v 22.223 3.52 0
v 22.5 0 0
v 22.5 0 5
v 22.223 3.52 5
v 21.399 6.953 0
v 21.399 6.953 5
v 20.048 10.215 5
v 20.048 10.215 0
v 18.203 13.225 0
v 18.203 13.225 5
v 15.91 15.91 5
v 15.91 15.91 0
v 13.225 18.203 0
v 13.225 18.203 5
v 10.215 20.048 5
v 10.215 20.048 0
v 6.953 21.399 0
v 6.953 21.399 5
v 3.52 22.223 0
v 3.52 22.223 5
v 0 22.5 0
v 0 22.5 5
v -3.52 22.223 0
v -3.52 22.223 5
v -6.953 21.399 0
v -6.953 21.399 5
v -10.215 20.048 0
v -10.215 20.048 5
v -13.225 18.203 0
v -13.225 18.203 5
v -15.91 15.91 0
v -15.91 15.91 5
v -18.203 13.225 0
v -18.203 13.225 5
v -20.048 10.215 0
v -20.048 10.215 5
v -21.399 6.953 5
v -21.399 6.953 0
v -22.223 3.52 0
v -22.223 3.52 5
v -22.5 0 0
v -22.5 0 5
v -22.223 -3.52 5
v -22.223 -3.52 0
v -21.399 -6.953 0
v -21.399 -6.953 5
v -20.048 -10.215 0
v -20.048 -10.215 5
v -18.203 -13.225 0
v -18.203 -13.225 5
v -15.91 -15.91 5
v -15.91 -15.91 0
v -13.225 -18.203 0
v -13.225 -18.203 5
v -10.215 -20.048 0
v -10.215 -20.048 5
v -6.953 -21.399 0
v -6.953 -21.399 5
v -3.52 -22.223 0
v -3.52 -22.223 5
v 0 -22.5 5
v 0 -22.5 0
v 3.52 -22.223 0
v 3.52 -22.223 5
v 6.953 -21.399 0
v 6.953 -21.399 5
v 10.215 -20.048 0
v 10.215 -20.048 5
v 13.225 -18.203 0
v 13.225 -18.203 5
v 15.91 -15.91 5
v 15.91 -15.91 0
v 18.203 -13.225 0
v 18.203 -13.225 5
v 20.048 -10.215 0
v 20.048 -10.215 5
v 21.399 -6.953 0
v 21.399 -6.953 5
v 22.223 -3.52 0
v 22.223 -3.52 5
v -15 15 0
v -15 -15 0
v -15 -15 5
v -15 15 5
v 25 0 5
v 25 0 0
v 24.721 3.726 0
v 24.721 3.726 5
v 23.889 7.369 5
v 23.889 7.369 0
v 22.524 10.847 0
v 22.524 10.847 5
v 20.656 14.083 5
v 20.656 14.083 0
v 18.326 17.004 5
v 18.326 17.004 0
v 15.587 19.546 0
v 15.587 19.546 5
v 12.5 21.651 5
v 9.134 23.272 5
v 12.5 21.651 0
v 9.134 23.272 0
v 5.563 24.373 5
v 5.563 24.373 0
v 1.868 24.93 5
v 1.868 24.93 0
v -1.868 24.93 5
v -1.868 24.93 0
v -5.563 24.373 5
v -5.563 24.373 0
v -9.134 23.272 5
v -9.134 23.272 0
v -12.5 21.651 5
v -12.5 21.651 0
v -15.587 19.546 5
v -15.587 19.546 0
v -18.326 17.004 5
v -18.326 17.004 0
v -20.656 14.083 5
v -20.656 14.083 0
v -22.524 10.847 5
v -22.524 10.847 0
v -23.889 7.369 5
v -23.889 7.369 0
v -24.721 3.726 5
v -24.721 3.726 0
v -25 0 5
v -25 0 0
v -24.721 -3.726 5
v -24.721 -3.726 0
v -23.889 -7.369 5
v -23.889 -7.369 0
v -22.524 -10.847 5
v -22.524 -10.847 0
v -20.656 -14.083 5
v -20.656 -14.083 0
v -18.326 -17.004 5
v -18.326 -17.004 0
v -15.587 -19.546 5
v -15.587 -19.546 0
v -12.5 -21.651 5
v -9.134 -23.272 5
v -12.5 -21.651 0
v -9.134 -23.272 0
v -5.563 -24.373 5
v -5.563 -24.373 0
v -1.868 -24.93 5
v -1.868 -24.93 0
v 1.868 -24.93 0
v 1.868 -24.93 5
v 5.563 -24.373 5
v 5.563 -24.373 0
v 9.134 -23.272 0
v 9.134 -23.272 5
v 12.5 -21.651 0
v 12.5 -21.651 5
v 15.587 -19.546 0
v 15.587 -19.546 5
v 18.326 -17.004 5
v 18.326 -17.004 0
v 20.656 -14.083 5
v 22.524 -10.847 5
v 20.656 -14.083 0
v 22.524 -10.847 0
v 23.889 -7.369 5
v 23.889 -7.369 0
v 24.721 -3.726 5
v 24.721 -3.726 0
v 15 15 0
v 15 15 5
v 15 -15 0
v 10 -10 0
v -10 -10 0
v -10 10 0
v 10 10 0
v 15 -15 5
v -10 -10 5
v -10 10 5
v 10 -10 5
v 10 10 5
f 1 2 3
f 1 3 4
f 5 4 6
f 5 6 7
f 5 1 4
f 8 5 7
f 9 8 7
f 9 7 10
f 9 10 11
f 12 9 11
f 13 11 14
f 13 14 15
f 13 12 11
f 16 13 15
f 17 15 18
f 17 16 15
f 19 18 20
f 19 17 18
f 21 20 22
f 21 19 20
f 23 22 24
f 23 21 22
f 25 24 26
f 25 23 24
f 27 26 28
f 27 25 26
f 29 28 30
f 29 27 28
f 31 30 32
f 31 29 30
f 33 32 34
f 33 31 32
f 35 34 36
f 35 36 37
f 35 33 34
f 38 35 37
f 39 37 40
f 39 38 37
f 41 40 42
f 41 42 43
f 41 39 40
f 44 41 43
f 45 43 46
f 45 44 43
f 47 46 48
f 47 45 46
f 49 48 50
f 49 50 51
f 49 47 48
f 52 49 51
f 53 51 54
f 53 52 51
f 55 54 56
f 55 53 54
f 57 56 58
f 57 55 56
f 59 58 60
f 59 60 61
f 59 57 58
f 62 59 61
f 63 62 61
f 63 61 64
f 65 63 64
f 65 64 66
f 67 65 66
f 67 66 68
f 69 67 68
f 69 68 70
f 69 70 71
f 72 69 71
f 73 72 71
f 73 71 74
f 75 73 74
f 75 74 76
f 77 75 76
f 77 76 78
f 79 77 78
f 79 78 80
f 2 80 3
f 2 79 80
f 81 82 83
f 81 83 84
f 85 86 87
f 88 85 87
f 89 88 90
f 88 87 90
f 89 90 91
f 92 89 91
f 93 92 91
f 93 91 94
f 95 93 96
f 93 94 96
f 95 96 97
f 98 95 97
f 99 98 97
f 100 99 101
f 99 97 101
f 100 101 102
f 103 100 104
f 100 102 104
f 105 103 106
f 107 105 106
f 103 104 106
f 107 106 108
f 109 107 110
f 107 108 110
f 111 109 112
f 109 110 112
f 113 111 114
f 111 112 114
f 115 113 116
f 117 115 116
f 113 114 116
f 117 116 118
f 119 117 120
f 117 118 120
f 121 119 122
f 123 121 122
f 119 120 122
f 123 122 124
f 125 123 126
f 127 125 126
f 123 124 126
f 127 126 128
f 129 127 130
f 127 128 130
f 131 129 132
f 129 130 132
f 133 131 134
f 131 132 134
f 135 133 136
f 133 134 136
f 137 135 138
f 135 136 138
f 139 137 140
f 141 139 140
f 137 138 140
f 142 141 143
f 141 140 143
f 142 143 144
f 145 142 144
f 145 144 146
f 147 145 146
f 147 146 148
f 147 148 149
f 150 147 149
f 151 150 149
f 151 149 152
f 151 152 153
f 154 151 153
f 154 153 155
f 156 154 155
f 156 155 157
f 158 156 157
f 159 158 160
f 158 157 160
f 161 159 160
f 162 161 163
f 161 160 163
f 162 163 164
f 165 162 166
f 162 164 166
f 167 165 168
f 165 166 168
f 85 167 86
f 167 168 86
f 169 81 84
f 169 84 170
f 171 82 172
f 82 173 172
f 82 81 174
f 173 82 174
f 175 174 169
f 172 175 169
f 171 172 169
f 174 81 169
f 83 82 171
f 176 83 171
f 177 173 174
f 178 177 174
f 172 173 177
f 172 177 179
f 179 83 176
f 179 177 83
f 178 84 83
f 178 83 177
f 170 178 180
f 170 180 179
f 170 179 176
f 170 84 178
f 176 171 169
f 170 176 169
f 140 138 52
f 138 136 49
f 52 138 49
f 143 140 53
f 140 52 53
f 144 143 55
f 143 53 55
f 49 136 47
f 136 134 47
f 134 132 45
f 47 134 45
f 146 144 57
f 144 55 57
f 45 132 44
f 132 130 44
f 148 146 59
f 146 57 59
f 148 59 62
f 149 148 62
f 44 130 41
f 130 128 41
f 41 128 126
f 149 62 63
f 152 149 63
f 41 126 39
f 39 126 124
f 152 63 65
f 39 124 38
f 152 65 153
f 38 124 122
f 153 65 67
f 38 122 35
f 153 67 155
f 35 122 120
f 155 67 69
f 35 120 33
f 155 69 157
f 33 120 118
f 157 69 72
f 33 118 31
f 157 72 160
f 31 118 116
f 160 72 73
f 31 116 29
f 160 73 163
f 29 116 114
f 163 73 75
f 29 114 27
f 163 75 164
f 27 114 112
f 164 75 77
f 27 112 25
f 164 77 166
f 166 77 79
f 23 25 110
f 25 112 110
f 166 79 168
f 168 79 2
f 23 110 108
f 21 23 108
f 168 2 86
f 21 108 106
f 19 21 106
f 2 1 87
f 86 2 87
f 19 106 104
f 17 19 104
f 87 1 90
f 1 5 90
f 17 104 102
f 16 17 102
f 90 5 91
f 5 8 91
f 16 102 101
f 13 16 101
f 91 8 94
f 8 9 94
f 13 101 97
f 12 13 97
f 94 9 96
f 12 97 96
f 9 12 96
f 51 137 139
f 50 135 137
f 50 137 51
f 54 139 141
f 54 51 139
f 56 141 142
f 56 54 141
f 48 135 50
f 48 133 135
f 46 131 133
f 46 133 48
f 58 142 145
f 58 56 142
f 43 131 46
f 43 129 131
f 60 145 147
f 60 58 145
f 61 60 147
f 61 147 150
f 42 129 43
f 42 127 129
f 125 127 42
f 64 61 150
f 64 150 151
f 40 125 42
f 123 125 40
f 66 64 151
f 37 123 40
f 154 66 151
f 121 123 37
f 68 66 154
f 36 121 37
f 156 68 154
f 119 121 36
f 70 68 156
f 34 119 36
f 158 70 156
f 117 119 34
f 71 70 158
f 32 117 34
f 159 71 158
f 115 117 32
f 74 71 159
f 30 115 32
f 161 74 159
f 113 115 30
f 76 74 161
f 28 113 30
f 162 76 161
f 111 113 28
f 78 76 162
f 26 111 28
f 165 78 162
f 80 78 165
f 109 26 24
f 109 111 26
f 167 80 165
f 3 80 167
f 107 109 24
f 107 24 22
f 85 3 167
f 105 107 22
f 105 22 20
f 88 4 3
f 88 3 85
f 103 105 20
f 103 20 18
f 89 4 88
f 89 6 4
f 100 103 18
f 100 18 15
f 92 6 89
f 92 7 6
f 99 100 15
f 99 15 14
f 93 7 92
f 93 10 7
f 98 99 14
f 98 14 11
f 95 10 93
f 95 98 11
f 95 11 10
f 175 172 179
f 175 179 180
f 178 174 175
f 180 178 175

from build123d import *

# Parameters (mm, degrees)
F0_R     = 25
F0_R_2   = 22.5
F1_DEPTH = 5
F2_W     = 30
F2_H     = 30
F2_W_2   = 20
F2_H_2   = 20
F3_DEPTH = 5


# Not quite as in the source:
# - a feature names something its author has since deleted; it is built from what else it names


with BuildPart() as f1:
    # F0 (on Top) → F1 (new body)
    with BuildSketch(Plane.XY):
        Circle(F0_R)
        Circle(F0_R_2, mode=Mode.SUBTRACT)
    extrude(amount=F1_DEPTH)


with BuildPart() as f3:
    # F2 (on face) → F3 (new body)
    with BuildSketch(Plane.XY):
        Rectangle(F2_W, F2_H)
        Rectangle(F2_W_2, F2_H_2, mode=Mode.SUBTRACT)
    extrude(amount=F3_DEPTH)


solid = Compound([f1.part, f3.part])
